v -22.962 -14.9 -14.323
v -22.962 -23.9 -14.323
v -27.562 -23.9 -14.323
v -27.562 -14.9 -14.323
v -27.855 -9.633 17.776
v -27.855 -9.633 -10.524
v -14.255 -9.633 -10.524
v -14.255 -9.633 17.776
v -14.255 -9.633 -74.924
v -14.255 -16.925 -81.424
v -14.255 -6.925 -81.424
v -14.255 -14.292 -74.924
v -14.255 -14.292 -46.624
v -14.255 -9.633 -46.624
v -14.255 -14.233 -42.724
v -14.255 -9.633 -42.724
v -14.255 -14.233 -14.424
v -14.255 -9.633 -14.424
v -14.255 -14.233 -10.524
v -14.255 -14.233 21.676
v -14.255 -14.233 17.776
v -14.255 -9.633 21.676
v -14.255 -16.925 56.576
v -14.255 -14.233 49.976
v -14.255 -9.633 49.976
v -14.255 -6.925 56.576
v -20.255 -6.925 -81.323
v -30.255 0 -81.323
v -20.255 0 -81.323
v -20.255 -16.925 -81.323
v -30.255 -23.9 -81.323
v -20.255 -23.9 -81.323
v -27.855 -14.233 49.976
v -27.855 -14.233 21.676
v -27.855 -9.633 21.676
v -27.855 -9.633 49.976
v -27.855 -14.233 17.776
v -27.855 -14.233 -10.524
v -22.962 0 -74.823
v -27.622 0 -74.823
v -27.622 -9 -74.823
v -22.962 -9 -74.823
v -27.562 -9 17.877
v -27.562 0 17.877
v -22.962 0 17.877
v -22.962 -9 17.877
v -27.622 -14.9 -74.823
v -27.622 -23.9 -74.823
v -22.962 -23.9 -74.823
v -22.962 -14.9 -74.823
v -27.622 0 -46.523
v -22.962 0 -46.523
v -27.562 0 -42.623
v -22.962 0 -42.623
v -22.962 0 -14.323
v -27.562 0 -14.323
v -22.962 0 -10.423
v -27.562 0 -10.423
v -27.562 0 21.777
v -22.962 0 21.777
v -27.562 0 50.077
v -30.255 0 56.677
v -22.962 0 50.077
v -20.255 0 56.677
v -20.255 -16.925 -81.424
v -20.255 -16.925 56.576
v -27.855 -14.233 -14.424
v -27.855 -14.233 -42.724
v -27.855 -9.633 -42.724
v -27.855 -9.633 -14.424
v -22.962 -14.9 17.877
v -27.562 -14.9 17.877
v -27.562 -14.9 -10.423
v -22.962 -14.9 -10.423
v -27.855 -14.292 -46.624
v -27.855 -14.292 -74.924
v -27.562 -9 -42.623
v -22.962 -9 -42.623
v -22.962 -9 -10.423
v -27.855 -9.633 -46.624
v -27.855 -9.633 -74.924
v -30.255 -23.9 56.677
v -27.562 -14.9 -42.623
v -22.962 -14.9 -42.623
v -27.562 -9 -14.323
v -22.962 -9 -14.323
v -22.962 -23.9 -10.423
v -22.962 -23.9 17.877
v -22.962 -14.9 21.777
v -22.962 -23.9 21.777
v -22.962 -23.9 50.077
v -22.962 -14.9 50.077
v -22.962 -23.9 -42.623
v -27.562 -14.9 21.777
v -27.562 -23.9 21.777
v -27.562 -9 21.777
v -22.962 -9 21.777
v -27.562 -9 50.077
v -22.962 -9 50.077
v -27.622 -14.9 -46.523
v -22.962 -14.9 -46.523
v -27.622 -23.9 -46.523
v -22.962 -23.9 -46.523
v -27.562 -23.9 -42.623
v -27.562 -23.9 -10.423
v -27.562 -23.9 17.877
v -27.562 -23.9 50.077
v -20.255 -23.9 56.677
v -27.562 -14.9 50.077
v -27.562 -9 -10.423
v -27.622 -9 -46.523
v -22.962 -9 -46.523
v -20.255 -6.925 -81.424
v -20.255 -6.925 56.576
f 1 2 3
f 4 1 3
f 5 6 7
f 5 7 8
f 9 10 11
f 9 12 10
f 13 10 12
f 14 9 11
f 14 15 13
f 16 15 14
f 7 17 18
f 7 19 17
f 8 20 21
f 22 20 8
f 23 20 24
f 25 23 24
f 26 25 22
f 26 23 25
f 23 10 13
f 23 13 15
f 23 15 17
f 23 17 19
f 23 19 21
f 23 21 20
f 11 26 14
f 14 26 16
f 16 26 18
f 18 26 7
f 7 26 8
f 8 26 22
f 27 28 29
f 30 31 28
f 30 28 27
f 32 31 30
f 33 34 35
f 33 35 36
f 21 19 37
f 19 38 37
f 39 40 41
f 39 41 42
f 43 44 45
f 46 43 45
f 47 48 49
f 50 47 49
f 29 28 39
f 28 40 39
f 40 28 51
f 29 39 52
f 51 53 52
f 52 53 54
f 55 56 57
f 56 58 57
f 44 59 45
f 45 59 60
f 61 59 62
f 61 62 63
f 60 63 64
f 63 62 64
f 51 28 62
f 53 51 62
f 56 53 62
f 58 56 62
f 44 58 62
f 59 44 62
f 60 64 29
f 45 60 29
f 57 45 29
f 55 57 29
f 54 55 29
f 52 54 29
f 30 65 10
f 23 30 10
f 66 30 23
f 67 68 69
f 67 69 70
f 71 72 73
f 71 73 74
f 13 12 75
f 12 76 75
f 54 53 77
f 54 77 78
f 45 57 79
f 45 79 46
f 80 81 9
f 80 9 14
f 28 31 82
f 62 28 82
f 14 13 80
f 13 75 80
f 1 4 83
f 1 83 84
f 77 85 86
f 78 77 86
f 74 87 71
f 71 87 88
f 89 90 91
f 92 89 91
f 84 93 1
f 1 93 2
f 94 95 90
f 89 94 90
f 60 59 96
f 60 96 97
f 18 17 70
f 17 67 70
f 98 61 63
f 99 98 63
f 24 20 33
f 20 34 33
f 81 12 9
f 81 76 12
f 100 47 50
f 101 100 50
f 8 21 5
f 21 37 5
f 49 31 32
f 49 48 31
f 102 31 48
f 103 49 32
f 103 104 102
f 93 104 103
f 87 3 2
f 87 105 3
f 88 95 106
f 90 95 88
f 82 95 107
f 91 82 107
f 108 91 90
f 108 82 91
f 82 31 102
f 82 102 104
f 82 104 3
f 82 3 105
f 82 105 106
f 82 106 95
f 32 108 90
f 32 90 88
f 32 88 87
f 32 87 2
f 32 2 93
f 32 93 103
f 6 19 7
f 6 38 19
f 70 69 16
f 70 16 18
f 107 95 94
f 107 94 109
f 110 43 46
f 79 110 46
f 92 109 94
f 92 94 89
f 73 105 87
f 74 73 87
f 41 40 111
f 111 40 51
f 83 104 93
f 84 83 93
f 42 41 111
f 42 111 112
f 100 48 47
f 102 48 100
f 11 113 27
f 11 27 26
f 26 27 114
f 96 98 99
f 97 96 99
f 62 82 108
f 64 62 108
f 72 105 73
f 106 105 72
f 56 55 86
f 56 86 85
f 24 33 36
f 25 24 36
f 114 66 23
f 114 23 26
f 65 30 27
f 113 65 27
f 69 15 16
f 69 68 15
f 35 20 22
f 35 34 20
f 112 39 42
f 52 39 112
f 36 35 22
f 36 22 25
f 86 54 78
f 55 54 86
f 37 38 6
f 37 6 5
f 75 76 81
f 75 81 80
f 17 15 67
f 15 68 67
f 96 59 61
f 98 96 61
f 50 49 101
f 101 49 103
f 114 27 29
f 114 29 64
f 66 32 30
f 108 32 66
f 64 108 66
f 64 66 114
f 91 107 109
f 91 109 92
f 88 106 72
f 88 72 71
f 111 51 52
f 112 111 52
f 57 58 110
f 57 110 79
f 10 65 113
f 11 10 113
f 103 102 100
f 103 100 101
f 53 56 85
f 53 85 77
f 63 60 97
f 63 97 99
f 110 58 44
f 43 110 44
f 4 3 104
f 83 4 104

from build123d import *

# Parameters (mm, degrees)
F0_W     = 10
F0_H     = 138
F0_W_2   = 4.6593984449
F0_H_2   = 28.3
F0_W_3   = 4.6
F1_DEPTH = 11.95
F2_DEPTH = 9
F4_W     = 10
F4_H     = 138
F4_W_2   = 4.6593984449
F4_H_2   = 28.3
F4_W_3   = 4.6
F5_DEPTH = 6
F6_DEPTH = 7.6


with BuildPart() as f1:
    # F0 (on Front) → F1 (new body)
    with BuildSketch(Plane.XZ):
        with Locations((-25.2545091997, -12.3230710179)):
            Rectangle(F0_W, F0_H)
        with Locations((-25.2918084222, -60.6730710179)):
            Rectangle(F0_W_2, F0_H_2, mode=Mode.SUBTRACT)
        Polygon((-27.5621091997, -41.1834381521), (-27.5621091997, -14.3230710179), (-22.9621091997, -14.3230710179), (-22.9621091997, -42.6230710179), (-27.5621091997, -42.6230710179), align=None, mode=Mode.SUBTRACT)
        with Locations((-25.2621091997, 3.7269289821)):
            Rectangle(F0_W_3, F0_H_2, mode=Mode.SUBTRACT)
        with Locations((-25.2621091997, 35.9269289821)):
            Rectangle(F0_W_3, F0_H_2, mode=Mode.SUBTRACT)
        with Locations((-25.2621091997, 35.9269289821)):
            Rectangle(F0_W_3, F0_H_2)
        with Locations((-25.2621091997, 3.7269289821)):
            Rectangle(F0_W_3, F0_H_2)
        Polygon((-22.9621091997, -14.3230710179), (-27.5621091997, -14.3230710179), (-27.5621091997, -41.1834381521), (-27.5621091997, -42.6230710179), (-22.9621091997, -42.6230710179), align=None)
        with Locations((-25.2918084222, -60.6730710179)):
            Rectangle(F0_W_2, F0_H_2)
    extrude(amount=F1_DEPTH)

    # F0 (on Front) → F2 (cut)
    with BuildSketch(Plane.XZ):
        with Locations((-25.2621091997, 35.9269289821)):
            Rectangle(F0_W_3, F0_H_2)
        with Locations((-25.2621091997, 3.7269289821)):
            Rectangle(F0_W_3, F0_H_2)
        Polygon((-22.9621091997, -14.3230710179), (-27.5621091997, -14.3230710179), (-27.5621091997, -41.1834381521), (-27.5621091997, -42.6230710179), (-22.9621091997, -42.6230710179), align=None)
        with Locations((-25.2918084222, -60.6730710179)):
            Rectangle(F0_W_2, F0_H_2)
    extrude(amount=F2_DEPTH, mode=Mode.SUBTRACT)

    # F3: F1 across face


with BuildPart() as f1_1:
    add(f1.part)
    add(f1.part.mirror(Plane(origin=(-25.2545091997, -11.95, -12.3230710179), x_dir=(1, 0, 0), z_dir=(0, -1, 0))))

    # F4 (on face) → F5 (join)
    with BuildSketch(Plane.YZ.offset(-20.2545091997)):
        with Locations((-11.9253657708, -12.4240700761)):
            Rectangle(F4_W, F4_H)
        with Locations((-11.9626649932, -60.7740700761)):
            Rectangle(F4_W_2, F4_H_2, mode=Mode.SUBTRACT)
        with Locations((-11.9329657708, -28.5740700761)):
            Rectangle(F4_W_3, F4_H_2, mode=Mode.SUBTRACT)
        with Locations((-11.9329657708, 3.6259299239)):
            Rectangle(F4_W_3, F4_H_2, mode=Mode.SUBTRACT)
        with Locations((-11.9329657708, 35.8259299239)):
            Rectangle(F4_W_3, F4_H_2, mode=Mode.SUBTRACT)
    extrude(amount=F5_DEPTH)

    # F6 (cut): faces of the model
    f6_faces = [f1_1.faces().sort_by_distance(p)[0] for p in [
        (-20.2545091997, -11.9329657708, 35.8259299239),
        (-20.2545091997, -11.9329657708, 3.6259299239),
        (-20.2545091997, -11.9329657708, -28.5740700761),
        (-20.2545091997, -11.9626649932, -60.7740700761),
    ]]
    extrude(f6_faces, amount=-F6_DEPTH, mode=Mode.SUBTRACT)


solid = f1_1.part
